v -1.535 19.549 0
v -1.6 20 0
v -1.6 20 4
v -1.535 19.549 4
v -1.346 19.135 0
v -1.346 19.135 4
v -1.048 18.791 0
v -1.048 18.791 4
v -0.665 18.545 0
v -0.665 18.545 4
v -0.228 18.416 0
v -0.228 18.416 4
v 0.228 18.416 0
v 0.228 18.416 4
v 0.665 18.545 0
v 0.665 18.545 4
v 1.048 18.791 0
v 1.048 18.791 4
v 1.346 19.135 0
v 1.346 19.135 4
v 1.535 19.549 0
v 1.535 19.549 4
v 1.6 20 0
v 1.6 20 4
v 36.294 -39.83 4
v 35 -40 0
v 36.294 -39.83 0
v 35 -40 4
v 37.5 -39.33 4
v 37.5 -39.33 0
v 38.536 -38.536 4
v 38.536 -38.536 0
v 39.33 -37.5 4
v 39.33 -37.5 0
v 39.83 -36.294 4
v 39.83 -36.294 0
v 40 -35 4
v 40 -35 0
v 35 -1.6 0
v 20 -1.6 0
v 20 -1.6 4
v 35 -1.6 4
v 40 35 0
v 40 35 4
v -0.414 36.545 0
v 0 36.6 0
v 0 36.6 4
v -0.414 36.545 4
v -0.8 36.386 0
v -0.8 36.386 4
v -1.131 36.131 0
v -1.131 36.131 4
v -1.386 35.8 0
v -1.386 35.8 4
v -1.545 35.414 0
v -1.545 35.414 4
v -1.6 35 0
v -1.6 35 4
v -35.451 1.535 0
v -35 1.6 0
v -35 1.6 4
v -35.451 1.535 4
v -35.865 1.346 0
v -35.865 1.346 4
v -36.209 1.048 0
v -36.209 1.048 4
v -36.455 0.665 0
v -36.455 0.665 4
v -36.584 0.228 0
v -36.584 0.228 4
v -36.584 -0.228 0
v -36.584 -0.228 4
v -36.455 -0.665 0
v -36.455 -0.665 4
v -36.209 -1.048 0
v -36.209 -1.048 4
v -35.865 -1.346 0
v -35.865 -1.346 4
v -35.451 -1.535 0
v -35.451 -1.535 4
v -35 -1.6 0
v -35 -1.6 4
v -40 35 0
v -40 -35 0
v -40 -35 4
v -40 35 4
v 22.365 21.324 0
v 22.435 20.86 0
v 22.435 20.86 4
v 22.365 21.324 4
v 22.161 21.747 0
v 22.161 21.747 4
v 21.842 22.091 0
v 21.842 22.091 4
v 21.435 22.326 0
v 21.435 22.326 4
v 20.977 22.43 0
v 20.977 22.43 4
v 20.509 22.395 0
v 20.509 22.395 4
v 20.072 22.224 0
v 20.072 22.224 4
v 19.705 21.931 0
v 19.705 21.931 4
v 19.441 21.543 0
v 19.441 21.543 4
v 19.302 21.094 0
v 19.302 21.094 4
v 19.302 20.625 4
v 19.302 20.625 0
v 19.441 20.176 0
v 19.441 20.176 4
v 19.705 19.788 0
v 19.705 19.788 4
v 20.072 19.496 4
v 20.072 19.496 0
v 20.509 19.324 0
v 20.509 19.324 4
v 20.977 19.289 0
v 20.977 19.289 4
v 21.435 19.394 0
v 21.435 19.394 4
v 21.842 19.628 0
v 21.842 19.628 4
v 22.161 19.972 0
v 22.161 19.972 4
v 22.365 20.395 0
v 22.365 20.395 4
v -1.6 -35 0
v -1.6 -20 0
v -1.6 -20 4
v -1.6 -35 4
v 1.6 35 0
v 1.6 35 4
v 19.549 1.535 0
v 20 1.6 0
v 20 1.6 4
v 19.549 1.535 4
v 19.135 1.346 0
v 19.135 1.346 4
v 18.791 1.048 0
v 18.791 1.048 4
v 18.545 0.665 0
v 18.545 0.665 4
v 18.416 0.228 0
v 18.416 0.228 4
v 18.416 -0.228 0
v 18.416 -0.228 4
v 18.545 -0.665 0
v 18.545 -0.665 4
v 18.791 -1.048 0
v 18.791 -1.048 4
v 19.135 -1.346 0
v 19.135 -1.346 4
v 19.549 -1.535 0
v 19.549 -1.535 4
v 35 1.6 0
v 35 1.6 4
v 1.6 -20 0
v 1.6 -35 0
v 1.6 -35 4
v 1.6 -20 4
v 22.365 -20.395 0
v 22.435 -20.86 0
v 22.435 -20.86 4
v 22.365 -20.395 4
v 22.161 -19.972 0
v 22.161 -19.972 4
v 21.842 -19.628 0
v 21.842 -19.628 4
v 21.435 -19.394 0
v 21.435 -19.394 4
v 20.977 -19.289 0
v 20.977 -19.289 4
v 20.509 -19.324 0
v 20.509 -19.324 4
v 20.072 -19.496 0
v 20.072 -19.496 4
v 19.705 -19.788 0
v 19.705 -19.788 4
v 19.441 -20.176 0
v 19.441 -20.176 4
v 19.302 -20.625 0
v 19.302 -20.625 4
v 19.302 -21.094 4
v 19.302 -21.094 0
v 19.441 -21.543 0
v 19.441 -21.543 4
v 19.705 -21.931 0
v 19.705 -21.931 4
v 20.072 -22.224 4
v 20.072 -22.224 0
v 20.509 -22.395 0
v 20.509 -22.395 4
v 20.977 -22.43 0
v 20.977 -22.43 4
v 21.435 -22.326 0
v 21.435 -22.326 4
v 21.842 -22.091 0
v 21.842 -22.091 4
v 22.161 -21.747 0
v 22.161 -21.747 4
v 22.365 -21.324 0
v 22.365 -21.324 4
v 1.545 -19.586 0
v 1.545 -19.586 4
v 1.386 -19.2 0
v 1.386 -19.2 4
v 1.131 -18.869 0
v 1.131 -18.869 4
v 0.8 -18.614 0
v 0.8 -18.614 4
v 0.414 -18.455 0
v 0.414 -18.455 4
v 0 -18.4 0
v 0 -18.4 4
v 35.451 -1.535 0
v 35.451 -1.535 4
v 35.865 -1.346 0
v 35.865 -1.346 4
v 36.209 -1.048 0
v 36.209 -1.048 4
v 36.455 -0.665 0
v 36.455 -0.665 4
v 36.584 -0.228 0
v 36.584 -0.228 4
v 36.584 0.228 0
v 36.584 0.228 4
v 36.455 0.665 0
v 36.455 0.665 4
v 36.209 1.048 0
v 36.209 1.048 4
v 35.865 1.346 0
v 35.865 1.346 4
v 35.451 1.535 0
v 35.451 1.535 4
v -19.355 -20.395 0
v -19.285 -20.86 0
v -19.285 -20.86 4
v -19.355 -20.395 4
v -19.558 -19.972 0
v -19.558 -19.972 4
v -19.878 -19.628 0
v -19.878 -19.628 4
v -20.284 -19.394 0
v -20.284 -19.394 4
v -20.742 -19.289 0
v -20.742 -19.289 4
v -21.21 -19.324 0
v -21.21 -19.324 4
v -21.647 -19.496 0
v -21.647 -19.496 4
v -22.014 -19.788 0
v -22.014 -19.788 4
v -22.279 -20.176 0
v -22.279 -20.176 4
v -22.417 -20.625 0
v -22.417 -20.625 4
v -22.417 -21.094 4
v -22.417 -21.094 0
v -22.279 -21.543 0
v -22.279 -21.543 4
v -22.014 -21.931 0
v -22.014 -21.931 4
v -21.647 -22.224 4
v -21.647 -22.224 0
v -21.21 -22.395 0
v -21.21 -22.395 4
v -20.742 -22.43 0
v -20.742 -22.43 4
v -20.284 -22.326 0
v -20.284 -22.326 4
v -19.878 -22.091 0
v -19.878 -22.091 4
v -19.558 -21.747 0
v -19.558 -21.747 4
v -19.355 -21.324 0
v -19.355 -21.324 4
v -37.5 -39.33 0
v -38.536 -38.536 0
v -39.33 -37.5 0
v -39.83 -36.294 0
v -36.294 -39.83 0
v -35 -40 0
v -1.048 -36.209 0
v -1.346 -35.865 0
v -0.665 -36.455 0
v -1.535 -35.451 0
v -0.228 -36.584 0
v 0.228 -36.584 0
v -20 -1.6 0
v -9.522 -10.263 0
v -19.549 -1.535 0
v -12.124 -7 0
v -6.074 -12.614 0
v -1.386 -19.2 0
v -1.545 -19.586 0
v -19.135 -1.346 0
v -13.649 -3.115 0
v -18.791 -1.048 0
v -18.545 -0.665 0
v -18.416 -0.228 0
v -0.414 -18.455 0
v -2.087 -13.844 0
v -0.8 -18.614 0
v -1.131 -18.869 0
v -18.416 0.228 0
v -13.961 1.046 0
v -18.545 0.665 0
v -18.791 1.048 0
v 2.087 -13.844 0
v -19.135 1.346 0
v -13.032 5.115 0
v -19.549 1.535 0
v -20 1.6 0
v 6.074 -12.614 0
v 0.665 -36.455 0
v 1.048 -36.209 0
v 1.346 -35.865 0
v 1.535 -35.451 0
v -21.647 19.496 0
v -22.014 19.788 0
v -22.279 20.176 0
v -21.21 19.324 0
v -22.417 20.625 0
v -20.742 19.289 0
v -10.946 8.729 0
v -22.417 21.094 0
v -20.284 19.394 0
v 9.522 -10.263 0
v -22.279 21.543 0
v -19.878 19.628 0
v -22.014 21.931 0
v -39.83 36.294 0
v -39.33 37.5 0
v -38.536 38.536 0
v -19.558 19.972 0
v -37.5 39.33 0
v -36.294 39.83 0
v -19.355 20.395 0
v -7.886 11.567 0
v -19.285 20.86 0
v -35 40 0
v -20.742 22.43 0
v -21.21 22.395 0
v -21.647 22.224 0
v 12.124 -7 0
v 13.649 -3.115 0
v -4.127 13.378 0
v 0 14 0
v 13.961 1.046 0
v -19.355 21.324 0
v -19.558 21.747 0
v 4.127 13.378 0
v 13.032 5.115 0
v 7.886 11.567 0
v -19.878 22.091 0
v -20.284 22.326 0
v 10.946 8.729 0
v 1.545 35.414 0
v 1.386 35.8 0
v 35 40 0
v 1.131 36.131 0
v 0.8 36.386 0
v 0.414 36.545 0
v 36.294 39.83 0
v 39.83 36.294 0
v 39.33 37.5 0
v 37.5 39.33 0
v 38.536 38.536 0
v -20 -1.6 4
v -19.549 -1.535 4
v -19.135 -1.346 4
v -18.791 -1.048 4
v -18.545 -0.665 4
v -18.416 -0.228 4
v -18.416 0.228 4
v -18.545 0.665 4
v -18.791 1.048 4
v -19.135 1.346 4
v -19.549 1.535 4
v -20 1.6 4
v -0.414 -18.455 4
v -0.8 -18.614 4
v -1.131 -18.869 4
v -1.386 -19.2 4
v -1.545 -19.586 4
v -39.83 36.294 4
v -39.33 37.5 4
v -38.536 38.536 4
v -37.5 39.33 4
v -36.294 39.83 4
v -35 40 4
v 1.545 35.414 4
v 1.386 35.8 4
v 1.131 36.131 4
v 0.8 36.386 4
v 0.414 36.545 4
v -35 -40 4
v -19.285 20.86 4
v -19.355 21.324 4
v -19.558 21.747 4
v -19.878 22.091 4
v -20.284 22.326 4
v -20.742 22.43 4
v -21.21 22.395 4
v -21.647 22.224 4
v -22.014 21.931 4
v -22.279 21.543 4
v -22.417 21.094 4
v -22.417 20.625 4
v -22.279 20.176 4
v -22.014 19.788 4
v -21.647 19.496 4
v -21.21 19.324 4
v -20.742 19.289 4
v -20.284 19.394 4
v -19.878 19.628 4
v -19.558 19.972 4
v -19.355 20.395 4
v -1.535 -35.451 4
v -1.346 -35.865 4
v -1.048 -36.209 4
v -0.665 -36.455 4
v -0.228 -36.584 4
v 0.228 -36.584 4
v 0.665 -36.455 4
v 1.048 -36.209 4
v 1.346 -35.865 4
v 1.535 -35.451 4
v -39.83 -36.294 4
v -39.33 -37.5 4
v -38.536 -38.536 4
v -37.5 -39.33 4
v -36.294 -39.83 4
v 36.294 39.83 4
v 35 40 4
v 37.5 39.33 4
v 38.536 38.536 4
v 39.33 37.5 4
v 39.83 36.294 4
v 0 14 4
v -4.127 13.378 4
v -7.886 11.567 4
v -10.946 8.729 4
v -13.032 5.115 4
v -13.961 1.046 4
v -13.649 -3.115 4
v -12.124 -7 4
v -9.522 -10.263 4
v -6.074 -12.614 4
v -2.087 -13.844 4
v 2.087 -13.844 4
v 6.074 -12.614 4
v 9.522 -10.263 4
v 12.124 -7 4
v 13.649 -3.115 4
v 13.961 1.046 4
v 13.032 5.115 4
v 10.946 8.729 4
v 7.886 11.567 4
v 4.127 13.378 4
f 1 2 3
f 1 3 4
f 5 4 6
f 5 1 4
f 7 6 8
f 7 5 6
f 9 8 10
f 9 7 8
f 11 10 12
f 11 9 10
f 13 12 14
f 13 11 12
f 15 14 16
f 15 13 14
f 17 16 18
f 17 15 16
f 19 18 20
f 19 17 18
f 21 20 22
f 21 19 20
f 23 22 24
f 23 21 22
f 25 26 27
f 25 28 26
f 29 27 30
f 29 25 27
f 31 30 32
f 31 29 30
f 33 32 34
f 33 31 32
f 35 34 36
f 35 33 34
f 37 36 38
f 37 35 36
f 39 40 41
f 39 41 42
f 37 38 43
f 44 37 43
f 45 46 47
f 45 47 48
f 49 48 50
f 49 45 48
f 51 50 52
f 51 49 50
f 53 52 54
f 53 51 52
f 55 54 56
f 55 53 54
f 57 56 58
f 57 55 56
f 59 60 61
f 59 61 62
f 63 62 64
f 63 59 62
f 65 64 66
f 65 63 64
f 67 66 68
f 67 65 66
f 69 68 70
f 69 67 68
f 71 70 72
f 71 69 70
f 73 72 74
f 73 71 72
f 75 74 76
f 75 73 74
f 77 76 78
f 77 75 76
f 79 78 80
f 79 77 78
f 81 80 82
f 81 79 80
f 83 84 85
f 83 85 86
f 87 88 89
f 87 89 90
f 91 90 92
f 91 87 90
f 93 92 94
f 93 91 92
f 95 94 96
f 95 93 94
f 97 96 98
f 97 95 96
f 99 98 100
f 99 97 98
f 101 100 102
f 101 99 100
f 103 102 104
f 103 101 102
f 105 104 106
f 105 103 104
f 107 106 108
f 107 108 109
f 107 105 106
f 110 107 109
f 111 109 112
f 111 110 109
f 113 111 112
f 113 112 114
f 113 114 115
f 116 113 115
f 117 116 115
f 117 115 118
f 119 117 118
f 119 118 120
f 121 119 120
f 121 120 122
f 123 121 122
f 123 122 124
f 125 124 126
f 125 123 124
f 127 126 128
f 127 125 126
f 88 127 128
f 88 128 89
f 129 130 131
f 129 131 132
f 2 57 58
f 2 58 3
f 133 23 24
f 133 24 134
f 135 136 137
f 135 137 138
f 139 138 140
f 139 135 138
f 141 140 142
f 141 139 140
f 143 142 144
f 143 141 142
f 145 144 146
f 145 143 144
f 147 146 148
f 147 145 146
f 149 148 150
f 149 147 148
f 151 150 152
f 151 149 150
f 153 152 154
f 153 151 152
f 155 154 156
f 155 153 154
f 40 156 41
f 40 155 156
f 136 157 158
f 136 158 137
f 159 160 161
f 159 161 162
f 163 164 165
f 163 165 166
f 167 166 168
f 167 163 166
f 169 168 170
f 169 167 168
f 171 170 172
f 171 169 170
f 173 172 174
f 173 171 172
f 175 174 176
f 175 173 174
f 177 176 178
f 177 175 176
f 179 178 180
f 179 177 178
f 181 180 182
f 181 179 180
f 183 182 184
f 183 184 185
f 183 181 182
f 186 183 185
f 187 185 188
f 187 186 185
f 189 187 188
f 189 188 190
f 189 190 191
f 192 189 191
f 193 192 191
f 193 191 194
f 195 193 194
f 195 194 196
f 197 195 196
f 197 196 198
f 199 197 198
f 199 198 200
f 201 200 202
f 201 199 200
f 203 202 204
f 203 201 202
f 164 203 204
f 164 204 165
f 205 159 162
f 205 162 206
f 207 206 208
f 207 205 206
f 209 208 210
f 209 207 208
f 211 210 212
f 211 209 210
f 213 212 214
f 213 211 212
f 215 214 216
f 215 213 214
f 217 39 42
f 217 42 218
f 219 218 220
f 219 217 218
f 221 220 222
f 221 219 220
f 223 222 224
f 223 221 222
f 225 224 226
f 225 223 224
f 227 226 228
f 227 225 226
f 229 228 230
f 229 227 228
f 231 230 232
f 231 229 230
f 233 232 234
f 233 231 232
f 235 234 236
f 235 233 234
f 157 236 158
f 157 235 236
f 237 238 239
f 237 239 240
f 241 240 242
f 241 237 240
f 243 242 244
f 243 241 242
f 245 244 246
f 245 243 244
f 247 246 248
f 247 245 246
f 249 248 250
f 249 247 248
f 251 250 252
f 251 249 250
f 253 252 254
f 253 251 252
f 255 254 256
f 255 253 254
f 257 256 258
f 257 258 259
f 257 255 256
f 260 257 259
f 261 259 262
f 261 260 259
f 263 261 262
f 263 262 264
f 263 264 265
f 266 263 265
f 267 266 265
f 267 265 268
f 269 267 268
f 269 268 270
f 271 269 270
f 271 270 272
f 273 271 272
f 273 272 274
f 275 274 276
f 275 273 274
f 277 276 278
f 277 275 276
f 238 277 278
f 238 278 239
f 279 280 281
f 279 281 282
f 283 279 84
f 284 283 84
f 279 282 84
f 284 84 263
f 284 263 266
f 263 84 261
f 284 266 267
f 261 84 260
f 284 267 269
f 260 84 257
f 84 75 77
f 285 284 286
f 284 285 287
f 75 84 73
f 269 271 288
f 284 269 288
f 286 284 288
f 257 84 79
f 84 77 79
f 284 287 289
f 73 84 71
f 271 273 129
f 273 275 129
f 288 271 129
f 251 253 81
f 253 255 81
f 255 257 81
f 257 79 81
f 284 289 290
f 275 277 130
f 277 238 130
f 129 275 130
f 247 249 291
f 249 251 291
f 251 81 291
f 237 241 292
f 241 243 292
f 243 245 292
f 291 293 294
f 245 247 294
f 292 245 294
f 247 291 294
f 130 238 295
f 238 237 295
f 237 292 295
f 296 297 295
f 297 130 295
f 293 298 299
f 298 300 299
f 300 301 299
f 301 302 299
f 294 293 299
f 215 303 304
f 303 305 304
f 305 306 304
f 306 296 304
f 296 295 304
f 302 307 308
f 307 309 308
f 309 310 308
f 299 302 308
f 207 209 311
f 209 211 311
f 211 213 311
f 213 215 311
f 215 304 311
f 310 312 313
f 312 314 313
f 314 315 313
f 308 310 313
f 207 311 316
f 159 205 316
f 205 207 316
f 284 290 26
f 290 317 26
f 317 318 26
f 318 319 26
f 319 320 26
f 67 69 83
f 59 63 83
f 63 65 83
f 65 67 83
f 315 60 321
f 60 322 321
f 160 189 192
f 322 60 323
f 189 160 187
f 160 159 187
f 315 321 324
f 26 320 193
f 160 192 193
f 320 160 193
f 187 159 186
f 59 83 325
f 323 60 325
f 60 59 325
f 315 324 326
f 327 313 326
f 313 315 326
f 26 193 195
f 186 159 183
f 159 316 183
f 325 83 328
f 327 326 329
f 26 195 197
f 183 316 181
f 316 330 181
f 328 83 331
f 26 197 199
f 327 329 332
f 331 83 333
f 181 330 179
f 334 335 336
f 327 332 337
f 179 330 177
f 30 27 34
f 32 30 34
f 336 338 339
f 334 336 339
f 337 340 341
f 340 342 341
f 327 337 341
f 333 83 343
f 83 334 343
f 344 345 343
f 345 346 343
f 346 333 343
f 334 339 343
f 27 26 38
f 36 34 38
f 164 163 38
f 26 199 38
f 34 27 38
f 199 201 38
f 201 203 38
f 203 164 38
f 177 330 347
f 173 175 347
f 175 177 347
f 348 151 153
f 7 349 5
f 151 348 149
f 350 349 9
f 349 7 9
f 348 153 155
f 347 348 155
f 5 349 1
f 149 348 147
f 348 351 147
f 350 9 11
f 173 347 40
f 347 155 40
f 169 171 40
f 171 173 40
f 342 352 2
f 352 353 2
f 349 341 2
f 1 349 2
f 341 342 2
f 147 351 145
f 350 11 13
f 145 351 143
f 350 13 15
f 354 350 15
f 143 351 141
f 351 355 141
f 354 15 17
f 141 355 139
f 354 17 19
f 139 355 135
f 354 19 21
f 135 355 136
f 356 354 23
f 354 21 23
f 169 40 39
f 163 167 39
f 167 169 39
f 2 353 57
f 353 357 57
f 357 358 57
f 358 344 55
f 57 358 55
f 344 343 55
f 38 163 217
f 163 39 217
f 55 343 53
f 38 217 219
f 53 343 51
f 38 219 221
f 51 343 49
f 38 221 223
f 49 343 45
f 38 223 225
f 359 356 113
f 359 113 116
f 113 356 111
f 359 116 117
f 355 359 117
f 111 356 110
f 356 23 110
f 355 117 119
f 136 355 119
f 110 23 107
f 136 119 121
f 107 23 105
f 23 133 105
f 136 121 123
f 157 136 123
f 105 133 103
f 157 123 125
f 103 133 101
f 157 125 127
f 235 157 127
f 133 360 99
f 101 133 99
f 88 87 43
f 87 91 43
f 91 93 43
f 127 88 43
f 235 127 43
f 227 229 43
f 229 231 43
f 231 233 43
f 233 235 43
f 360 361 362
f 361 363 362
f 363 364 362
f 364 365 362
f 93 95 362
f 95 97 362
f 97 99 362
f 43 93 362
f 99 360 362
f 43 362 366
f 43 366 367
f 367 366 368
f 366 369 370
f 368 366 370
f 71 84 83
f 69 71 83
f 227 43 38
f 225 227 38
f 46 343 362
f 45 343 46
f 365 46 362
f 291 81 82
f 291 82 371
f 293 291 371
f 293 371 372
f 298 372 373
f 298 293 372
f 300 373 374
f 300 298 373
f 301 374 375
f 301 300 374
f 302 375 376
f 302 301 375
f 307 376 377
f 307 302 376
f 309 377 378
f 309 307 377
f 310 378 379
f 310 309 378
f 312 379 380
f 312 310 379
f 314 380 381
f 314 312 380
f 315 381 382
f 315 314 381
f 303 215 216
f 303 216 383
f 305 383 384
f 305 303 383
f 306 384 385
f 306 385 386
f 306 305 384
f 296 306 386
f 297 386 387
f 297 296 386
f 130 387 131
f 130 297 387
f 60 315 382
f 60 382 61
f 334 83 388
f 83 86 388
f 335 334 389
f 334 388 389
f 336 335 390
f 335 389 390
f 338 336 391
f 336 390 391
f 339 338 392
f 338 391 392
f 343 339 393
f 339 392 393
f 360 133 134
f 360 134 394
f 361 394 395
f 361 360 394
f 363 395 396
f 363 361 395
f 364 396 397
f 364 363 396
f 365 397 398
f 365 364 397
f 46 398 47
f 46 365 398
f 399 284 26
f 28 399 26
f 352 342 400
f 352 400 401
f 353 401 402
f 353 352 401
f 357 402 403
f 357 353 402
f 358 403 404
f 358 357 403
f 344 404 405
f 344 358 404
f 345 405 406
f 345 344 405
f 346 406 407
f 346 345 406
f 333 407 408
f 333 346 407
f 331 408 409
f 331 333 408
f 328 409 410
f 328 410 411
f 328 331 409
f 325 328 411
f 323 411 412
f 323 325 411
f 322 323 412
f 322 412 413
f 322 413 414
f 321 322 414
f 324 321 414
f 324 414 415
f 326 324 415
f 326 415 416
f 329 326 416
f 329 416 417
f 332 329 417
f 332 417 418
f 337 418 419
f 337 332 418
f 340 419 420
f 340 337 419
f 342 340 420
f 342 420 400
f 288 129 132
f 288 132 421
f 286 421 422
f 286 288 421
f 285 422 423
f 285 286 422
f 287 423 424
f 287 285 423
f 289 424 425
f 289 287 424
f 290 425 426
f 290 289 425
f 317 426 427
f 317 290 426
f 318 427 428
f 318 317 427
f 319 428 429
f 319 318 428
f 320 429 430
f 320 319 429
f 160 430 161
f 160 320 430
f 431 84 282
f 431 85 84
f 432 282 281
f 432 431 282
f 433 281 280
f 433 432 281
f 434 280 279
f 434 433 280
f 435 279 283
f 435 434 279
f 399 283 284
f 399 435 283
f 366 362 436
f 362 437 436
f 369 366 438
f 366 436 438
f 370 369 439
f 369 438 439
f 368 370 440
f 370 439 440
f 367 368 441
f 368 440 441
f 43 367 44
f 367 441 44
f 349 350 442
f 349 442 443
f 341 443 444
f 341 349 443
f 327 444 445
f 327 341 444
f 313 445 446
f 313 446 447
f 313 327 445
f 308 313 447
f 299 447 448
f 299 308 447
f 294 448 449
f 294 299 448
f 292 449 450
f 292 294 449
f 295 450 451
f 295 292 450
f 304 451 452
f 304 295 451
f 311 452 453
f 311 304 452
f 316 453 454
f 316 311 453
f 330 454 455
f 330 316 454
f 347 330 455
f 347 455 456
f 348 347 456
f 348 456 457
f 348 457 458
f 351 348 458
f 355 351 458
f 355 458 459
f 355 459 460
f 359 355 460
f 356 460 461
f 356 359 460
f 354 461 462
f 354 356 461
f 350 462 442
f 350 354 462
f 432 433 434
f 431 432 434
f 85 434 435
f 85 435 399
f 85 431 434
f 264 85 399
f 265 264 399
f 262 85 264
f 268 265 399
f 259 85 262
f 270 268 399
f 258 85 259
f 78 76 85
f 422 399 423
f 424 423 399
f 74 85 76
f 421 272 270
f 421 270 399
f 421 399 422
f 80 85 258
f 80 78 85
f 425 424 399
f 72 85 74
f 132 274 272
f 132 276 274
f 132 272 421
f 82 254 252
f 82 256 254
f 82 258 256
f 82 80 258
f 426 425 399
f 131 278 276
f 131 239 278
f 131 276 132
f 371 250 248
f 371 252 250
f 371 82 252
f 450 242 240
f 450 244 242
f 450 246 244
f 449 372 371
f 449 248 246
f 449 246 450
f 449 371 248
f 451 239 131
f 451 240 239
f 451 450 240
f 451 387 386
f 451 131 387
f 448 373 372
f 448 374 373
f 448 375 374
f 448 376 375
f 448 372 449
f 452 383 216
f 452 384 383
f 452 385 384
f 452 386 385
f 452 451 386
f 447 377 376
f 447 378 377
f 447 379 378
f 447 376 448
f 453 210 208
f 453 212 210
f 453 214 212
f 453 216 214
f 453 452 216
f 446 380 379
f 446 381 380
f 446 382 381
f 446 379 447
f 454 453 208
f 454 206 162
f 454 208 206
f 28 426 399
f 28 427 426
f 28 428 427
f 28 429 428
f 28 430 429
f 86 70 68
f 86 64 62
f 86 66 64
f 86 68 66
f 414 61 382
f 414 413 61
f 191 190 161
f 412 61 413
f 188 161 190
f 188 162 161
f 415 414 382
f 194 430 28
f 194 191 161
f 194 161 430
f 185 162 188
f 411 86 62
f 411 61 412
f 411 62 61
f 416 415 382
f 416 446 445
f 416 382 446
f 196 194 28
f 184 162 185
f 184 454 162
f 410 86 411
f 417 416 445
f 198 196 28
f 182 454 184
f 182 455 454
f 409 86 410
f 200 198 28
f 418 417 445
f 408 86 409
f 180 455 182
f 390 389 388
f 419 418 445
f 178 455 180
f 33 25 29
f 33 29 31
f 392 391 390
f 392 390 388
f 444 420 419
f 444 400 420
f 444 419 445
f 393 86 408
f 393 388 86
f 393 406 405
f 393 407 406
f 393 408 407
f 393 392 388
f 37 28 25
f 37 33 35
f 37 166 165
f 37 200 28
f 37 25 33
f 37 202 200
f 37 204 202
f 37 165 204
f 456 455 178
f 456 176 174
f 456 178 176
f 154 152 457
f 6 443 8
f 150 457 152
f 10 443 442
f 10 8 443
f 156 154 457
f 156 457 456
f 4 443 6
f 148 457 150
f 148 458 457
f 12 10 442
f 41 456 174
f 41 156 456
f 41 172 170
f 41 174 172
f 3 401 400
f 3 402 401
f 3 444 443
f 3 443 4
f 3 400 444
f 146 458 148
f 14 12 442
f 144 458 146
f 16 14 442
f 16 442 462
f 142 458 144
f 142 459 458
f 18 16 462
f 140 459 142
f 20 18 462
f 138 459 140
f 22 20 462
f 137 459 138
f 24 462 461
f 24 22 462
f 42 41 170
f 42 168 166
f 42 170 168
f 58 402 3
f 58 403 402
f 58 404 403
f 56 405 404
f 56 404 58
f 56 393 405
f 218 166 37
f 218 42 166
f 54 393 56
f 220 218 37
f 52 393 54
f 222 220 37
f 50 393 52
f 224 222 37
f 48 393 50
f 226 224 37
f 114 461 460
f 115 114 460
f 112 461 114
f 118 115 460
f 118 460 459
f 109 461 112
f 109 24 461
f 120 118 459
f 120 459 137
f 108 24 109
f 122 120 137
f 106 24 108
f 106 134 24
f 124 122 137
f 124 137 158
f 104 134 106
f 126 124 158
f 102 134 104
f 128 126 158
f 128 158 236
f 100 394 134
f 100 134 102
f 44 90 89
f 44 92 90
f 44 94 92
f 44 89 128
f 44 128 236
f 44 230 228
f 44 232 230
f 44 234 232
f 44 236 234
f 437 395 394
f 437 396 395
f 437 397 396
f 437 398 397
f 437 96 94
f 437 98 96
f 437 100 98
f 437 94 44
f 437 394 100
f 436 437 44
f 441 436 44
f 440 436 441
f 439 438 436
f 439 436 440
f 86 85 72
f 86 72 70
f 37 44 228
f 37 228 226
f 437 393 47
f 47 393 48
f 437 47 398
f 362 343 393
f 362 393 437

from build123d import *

# Parameters (mm, degrees)
SKETCH2_W           = 80
SKETCH2_H           = 80
SKETCH2_R           = 1.575
BOSS_EXTRUDE1_DEPTH = 4
FILLET1_R           = 5


with BuildPart() as part:
    # Sketch2 → Boss-Extrude1 (new body)
    with BuildSketch(Plane.XY):
        Rectangle(SKETCH2_W, SKETCH2_H)
        with Locations((-20.859650045, -20.859650045)):
            Circle(SKETCH2_R, mode=Mode.SUBTRACT)
        with Locations((-20.859650045, 20.859650045)):
            Circle(SKETCH2_R, mode=Mode.SUBTRACT)
        with Locations((20.859650045, 20.859650045)):
            Circle(SKETCH2_R, mode=Mode.SUBTRACT)
        with Locations((20.859650045, -20.859650045)):
            Circle(SKETCH2_R, mode=Mode.SUBTRACT)
        with BuildLine():
            Line((1.6, 20), (1.6, 35))
            ThreePointArc((1.6, 35), (1.13137085, 36.13137085), (0, 36.6))
            ThreePointArc((0, 36.6), (-1.13137085, 36.13137085), (-1.6, 35))
            Line((-1.6, 35), (-1.6, 20))
            ThreePointArc((-1.6, 20), (0, 18.4), (1.6, 20))
        make_face(mode=Mode.SUBTRACT)
        with BuildLine():
            Line((1.6, -35), (1.6, -20))
            ThreePointArc((1.6, -20), (1.13137085, -18.86862915), (0, -18.4))
            ThreePointArc((0, -18.4), (-1.13137085, -18.86862915), (-1.6, -20))
            Line((-1.6, -20), (-1.6, -35))
            ThreePointArc((-1.6, -35), (0, -36.6), (1.6, -35))
        make_face(mode=Mode.SUBTRACT)
        with BuildLine():
            Line((20, -1.6), (35, -1.6))
            ThreePointArc((35, -1.6), (36.6, 0), (35, 1.6))
            Line((35, 1.6), (20, 1.6))
            ThreePointArc((20, 1.6), (18.4, 0), (20, -1.6))
        make_face(mode=Mode.SUBTRACT)
        with BuildLine():
            Line((-35, -1.6), (-20, -1.6))
            ThreePointArc((-20, -1.6), (-18.4, 0), (-20, 1.6))
            Line((-20, 1.6), (-35, 1.6))
            ThreePointArc((-35, 1.6), (-36.6, 0), (-35, -1.6))
        make_face(mode=Mode.SUBTRACT)
        with BuildLine():
            ThreePointArc((0, -14), (14, 0), (0, 14))
            ThreePointArc((0, 14), (-14, 0), (0, -14))
        make_face(mode=Mode.SUBTRACT)
    extrude(amount=BOSS_EXTRUDE1_DEPTH)

    # Fillet1
    fillet1_edges = [part.edges().sort_by_distance(p)[0] for p in [
        (40, -40, 2),
        (-40, -40, 2),
        (-40, 40, 2),
        (40, 40, 2),
    ]]
    fillet(fillet1_edges, radius=FILLET1_R)


solid = part.part
